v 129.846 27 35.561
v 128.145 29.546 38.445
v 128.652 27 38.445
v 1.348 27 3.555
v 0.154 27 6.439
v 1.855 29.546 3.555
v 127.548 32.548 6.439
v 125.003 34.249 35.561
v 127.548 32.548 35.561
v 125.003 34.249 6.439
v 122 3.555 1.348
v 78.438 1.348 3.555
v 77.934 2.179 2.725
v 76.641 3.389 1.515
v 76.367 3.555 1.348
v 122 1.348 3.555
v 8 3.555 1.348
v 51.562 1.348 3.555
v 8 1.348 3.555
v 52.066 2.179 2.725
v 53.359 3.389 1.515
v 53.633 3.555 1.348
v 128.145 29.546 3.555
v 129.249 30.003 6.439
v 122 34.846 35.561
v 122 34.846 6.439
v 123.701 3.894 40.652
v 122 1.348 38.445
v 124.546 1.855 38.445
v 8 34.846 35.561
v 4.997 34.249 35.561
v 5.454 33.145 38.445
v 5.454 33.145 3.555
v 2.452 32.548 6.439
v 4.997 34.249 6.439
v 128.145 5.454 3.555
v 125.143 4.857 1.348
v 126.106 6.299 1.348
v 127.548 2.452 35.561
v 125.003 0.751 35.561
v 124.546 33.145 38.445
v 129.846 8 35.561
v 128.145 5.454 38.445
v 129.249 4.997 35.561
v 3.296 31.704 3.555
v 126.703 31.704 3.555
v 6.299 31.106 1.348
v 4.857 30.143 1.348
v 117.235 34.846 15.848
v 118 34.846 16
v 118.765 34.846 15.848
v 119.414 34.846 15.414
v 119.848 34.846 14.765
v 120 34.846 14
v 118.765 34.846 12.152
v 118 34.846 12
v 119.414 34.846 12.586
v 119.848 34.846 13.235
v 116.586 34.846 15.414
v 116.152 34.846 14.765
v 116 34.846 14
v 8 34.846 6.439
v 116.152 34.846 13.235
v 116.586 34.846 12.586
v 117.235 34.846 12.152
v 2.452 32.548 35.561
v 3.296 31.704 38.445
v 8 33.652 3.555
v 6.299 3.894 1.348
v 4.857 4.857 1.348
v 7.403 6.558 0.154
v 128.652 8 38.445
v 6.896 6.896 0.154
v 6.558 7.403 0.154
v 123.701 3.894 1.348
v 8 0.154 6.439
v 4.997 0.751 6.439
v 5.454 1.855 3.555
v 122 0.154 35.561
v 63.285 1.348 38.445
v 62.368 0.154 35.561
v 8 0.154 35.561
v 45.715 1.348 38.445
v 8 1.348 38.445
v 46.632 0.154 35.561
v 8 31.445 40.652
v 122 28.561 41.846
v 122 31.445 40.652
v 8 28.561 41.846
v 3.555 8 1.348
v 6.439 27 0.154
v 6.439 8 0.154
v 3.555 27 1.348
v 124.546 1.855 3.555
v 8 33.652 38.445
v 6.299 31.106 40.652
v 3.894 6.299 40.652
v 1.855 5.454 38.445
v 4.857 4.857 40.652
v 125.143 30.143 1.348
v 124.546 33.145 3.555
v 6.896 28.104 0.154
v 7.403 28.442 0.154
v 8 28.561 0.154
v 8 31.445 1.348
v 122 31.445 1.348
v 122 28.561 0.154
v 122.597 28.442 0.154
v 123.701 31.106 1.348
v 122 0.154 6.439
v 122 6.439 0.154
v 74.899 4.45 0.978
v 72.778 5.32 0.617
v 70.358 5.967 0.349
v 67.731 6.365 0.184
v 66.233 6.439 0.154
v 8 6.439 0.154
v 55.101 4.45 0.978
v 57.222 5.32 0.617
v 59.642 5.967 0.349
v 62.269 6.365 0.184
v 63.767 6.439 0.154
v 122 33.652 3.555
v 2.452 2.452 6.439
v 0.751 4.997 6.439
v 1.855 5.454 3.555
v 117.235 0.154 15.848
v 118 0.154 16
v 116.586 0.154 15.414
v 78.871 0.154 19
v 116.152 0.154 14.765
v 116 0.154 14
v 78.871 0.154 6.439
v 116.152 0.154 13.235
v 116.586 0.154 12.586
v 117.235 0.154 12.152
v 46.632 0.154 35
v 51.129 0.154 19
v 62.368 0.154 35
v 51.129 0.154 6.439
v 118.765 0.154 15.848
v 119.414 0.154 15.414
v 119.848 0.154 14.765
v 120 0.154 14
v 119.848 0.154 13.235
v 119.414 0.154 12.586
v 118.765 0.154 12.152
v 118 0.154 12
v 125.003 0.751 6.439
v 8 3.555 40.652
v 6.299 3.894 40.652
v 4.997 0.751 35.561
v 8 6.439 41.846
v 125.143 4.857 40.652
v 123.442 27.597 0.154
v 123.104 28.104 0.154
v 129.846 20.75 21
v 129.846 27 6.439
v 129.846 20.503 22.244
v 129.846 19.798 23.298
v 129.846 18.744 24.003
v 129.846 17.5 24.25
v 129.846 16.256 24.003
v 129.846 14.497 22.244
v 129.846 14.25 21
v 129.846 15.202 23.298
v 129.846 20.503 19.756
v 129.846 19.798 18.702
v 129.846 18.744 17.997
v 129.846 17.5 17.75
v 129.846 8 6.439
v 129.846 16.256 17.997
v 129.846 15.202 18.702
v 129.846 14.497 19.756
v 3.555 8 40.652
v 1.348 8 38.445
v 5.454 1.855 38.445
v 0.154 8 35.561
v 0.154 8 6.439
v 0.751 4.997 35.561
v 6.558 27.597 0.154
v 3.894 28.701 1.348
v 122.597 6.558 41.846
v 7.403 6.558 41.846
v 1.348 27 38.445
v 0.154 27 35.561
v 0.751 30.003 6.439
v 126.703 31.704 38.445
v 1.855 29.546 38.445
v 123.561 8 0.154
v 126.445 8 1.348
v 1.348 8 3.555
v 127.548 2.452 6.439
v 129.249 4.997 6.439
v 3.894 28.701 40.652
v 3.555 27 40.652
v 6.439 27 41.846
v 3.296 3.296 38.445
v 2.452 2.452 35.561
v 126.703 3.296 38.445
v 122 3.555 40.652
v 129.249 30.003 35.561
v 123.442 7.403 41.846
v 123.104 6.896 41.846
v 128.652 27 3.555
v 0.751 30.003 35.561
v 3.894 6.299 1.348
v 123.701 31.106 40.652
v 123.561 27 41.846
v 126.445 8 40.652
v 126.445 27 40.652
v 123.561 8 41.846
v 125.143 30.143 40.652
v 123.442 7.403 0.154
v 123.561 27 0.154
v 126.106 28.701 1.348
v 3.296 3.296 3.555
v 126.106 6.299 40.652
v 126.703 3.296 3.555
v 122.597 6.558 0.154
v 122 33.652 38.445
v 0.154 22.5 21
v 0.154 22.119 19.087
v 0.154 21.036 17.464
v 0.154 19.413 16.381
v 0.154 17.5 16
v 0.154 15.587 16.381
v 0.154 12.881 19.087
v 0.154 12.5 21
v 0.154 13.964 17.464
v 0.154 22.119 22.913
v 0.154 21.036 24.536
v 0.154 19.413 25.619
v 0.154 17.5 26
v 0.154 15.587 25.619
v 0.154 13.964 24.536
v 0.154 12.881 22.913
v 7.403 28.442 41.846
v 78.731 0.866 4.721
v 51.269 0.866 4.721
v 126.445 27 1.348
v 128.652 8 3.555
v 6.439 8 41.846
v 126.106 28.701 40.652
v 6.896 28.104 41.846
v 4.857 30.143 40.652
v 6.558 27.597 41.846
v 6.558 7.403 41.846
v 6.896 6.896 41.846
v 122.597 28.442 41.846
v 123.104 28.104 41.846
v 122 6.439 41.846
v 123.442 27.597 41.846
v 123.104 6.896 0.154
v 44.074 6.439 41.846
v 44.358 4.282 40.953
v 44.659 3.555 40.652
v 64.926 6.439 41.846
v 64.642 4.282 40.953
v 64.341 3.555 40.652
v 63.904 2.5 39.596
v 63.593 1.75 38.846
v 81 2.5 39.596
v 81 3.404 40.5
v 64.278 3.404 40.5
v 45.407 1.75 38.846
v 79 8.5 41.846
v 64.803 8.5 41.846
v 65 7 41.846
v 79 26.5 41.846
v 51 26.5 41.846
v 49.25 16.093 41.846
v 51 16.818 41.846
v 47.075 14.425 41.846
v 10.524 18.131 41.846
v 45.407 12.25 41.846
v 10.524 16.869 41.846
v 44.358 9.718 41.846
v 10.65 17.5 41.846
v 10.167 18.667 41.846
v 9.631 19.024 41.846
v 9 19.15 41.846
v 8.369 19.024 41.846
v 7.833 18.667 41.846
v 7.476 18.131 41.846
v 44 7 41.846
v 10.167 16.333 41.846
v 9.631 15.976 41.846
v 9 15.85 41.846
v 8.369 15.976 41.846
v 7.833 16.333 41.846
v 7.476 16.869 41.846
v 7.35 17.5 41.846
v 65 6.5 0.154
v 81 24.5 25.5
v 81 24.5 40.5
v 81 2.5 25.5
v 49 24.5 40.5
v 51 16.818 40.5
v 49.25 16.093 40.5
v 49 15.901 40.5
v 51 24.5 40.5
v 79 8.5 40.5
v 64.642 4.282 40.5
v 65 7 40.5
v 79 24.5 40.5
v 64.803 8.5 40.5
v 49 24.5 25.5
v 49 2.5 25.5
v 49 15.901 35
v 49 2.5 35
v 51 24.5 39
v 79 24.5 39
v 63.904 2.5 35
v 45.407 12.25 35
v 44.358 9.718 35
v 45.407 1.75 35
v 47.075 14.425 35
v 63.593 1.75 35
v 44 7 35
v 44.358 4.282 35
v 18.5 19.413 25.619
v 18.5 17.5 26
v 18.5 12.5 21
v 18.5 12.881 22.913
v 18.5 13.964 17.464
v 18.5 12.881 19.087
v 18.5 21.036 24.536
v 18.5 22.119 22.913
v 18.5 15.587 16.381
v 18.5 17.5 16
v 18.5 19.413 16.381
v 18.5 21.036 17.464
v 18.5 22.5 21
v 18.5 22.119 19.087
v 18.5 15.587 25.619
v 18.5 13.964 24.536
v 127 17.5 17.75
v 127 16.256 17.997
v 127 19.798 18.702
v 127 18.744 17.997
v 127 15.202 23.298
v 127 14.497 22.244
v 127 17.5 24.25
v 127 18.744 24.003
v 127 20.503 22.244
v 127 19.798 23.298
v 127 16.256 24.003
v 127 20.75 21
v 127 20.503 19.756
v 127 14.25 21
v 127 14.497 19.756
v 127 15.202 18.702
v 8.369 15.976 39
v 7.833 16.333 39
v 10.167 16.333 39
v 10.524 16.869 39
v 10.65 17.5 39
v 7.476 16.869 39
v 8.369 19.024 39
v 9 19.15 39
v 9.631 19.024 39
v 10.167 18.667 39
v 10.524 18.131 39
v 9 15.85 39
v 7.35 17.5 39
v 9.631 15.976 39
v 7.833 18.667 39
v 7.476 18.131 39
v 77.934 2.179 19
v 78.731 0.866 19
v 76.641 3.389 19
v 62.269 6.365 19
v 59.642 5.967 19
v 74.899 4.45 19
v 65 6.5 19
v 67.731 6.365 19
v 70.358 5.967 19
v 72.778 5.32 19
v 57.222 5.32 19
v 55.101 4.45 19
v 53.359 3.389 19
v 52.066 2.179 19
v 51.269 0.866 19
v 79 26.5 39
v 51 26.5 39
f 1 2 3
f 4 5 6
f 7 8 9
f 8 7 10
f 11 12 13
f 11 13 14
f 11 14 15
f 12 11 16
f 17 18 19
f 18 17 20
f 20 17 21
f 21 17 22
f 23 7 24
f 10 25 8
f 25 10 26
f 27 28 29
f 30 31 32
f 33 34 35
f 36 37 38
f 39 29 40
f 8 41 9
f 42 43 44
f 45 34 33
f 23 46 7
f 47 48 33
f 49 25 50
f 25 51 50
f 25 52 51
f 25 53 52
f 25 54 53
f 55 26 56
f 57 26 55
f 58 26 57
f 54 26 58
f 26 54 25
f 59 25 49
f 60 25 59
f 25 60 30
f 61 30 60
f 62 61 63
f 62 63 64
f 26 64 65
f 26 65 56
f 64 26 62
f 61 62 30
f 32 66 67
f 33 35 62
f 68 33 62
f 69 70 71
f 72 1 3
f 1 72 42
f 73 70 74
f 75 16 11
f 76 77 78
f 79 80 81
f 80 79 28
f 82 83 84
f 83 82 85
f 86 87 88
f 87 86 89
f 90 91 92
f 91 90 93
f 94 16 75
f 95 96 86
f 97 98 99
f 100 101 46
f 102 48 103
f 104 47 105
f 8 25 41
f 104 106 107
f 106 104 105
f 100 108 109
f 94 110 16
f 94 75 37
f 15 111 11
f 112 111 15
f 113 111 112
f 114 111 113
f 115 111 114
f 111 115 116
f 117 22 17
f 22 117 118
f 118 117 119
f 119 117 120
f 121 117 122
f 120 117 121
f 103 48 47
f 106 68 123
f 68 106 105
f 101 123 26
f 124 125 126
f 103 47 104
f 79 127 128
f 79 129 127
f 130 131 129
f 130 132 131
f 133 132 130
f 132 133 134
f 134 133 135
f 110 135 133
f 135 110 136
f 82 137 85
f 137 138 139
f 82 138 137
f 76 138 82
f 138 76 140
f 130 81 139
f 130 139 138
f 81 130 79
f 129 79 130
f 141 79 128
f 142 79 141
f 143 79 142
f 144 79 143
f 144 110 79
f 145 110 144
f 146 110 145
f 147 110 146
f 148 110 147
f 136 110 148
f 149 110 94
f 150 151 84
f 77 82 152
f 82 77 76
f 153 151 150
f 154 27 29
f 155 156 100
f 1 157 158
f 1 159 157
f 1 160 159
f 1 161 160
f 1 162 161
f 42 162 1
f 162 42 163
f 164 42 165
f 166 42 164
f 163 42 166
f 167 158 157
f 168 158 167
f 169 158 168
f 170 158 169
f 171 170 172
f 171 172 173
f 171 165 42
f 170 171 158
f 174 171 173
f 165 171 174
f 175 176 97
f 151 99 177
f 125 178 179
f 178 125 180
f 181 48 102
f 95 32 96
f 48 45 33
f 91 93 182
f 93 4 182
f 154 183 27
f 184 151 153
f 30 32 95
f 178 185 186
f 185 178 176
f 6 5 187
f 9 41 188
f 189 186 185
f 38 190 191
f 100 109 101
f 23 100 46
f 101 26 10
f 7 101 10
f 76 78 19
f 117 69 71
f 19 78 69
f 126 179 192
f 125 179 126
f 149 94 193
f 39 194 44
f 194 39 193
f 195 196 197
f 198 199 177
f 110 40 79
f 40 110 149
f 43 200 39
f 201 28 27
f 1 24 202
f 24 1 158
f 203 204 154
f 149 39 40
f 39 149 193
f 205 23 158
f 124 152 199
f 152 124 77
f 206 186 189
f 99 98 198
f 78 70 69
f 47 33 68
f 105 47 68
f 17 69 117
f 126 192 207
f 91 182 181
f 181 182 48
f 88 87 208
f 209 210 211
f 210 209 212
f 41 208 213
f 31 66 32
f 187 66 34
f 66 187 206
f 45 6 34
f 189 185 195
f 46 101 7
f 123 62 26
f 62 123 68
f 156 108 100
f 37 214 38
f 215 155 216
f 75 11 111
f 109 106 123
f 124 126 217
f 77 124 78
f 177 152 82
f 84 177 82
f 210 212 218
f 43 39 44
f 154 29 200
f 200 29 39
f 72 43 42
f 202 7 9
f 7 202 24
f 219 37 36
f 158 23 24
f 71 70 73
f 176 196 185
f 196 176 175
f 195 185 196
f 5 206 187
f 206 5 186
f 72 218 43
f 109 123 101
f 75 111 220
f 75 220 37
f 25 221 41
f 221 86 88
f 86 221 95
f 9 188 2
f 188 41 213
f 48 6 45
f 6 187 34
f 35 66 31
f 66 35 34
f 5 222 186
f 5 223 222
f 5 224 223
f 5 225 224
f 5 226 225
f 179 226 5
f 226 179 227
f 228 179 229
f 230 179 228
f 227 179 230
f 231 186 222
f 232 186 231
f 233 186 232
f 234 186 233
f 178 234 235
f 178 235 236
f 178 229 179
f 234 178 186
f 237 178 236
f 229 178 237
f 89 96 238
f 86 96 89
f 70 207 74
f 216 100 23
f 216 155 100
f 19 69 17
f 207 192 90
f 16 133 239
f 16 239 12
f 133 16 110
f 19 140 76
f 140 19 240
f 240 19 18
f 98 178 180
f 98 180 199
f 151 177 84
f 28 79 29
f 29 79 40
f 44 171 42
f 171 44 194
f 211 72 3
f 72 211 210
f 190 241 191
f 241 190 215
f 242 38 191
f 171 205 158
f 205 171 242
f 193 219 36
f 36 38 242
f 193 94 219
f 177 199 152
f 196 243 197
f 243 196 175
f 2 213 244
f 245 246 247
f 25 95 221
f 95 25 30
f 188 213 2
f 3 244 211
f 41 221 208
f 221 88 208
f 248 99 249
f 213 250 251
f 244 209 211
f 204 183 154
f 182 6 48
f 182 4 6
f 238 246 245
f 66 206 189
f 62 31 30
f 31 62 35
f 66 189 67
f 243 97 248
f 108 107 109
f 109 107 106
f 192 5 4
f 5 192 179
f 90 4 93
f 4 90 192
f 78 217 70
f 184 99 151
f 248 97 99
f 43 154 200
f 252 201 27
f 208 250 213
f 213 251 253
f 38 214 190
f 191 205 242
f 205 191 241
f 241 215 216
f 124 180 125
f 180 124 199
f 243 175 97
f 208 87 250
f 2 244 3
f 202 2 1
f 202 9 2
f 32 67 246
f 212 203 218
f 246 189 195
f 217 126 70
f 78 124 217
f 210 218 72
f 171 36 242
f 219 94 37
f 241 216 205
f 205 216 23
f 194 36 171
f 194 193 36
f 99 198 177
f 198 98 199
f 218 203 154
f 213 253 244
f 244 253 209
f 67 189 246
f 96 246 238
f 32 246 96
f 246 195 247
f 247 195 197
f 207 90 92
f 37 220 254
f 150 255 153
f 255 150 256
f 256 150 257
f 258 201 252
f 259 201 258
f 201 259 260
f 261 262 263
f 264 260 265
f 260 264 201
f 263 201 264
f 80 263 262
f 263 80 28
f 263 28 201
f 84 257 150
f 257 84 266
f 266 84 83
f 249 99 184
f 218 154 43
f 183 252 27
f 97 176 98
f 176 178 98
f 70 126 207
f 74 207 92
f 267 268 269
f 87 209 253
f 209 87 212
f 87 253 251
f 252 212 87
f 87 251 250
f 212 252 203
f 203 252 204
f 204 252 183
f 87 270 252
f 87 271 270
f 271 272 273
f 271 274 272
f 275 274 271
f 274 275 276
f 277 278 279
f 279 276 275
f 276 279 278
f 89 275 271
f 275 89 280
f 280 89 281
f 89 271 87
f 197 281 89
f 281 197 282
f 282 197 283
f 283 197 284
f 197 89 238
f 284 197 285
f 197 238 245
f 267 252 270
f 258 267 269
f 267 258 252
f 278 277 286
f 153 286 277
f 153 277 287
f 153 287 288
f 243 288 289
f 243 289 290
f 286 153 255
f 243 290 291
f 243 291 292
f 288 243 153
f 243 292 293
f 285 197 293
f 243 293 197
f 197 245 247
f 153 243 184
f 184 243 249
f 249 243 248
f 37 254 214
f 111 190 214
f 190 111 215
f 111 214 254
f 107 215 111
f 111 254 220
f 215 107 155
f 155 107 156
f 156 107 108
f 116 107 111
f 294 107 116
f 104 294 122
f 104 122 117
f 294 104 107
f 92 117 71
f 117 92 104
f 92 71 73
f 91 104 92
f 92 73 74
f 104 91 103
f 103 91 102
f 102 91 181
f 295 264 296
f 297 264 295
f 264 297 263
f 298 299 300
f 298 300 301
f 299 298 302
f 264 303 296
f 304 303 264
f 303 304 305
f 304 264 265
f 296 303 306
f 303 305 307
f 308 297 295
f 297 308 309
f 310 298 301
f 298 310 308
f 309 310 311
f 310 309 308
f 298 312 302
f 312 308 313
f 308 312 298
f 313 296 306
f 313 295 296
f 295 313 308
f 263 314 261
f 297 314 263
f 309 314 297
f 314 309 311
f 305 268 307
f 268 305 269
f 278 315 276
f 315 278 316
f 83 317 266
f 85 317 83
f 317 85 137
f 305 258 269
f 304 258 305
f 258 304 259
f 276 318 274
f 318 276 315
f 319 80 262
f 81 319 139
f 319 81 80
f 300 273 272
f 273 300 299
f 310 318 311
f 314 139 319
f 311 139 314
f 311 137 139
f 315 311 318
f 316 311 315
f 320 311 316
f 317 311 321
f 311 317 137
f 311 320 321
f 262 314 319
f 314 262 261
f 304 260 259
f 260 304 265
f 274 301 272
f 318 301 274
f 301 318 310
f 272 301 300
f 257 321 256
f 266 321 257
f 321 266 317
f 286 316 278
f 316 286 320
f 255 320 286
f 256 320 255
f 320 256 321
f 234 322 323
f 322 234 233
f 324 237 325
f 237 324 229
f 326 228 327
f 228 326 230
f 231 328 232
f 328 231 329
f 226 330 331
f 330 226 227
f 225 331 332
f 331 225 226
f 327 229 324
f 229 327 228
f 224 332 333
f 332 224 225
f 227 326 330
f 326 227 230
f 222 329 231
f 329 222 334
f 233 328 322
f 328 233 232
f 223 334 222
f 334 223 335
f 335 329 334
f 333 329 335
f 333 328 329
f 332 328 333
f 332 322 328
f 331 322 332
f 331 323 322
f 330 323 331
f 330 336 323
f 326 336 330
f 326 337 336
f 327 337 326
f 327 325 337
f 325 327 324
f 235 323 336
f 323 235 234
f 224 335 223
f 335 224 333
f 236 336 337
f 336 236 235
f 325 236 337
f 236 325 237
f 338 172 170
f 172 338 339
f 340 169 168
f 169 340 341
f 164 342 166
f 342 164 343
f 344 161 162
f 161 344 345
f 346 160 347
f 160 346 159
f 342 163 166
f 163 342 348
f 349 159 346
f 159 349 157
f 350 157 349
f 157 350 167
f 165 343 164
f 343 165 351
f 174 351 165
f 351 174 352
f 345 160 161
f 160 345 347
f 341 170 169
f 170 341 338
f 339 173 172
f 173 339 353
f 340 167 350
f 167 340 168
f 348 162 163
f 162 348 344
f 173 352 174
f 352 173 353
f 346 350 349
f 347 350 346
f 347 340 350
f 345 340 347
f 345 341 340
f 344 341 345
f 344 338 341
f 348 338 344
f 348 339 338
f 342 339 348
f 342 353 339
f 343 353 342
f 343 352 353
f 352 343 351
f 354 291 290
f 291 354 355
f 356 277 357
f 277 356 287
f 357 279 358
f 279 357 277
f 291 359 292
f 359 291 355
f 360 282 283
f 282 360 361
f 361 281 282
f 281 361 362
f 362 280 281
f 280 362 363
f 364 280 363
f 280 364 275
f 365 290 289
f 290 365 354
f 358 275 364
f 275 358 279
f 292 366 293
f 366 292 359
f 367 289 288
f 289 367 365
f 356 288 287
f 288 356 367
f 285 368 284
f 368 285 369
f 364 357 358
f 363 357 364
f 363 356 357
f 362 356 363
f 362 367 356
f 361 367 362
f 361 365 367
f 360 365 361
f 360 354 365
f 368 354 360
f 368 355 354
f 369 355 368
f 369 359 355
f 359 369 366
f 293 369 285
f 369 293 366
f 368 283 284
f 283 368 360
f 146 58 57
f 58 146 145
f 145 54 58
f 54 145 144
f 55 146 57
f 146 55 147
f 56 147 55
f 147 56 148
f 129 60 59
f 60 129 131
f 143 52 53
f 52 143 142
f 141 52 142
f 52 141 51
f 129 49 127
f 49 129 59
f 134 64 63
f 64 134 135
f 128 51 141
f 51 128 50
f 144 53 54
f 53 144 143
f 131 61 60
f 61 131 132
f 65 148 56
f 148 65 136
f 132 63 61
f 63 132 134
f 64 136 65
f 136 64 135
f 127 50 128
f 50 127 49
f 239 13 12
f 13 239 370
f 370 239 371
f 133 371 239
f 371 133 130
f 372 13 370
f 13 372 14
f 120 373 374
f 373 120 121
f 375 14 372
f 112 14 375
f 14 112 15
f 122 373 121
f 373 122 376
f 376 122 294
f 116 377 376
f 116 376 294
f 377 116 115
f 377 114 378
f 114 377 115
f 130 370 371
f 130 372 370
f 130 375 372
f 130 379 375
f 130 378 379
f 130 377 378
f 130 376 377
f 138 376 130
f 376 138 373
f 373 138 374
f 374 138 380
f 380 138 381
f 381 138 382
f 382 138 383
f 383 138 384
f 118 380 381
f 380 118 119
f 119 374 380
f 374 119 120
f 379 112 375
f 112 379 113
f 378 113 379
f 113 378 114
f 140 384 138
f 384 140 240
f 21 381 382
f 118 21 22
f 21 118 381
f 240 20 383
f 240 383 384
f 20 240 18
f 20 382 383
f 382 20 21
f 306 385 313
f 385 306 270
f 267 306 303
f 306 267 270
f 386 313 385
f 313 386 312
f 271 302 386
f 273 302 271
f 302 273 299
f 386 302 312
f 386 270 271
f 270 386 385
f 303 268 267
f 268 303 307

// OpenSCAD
/**
 * rfi_sniffer_handle.scad — TM-RFI-ENC-004 Rev A
 * RFI Near-Field Sniffer Probe Handle
 *
 * Two configurations sharing same handle body:
 *   Config A: H-field shielded loop (100mm loop, RG-178 coax)
 *   Config B: E-field rod probe (100mm rod, JFET preamp in handle)
 *
 * Features:
 *   - Ergonomic pistol-grip handle, 130mm long
 *   - Probe tip snaps into front socket (interchangeable tips)
 *   - Preamp PCB cavity: 30×20×12 mm (optional, for E-field active version)
 *   - Cable exit: rear (SMA(F) connector or strain-relief for RG-178)
 *   - Battery cavity: CR2032 × 1 (for preamp power if no bias-T)
 *   - Loop tip socket: holds 100mm loop securely
 *   - Rod tip socket: holds 100mm rod securely
 *
 * Envelope: 150×45×35 mm
 */

// ── Parameters ─────────────────────────────────────────────────────────────
// Handle body
handle_l  = 130.0;  // length
handle_w  = 35.0;   // width
handle_h  = 42.0;   // height (grip height)
wall      = 2.5;
r = 8.0;
$fn = 32;

// Probe tip socket (front)
tip_bore_d  = 10.0;   // bore for SMA barrel or coax
tip_bore_l  = 18.0;   // depth of socket

// PCB cavity (for preamp)
pcb_w   = 32.0;
pcb_d   = 22.0;
pcb_h   = 14.0;

// Battery cavity (CR2032: 20mm dia × 3.2mm)
batt_d  = 21.0;
batt_h  = 4.5;

// Cable exit (rear SMA: 6.5mm hole, or strain relief: 9mm)
rear_exit_d = 6.5;   // SMA(F) or strain relief

// Set screw (probe tip retention, M3)
sscrew_d = 3.3;

// Mounting hole (for lanyard or bench mount)
lanyard_d = 4.0;

// ── Body ─────────────────────────────────────────────────────────────────────
module handle_body() {
    difference() {
        // Outer ergonomic shape: rounded cuboid with finger indentations
        hull()
            for (x=[r, handle_l-r]) for (y=[r, handle_w-r]) for (z=[r, handle_h-r])
                translate([x, y, z]) sphere(r=r, $fn=16);

        // Interior cavity (preamp + battery space)
        translate([handle_l/2 - pcb_w/2, wall, handle_h - pcb_h - wall])
            cube([pcb_w, pcb_d, pcb_h + 1]);

        // Battery cavity (side access)
        translate([handle_l/2 - batt_d/2, handle_w/2 - batt_d/2, handle_h - batt_h - wall])
            cylinder(h=batt_h+wall+1, d=batt_d, $fn=24);

        // Probe tip socket (front face)
        translate([-0.5, handle_w/2, handle_h/2])
        rotate([0, 90, 0])
            cylinder(h=tip_bore_l+1, d=tip_bore_d, $fn=16);

        // Cable exit (rear face, SMA)
        translate([handle_l+0.5, handle_w/2, handle_h/2])
        rotate([0, -90, 0])
            cylinder(h=wall+1, d=rear_exit_d, $fn=16);

        // Set screw for probe tip retention (top, near front)
        translate([tip_bore_l/2, handle_w/2, handle_h + 0.5])
        rotate([180, 0, 0])
            cylinder(h=wall+1, d=sscrew_d, $fn=16);

        // Lanyard hole (rear bottom)
        translate([handle_l - 12, -0.5, handle_h/3])
        rotate([-90, 0, 0])
            cylinder(h=handle_w+1, d=lanyard_d, $fn=16);

        // Finger groove (makes grip ergonomic) — slight indentation on bottom
        translate([handle_l/2, -0.5, -2])
            scale([1, 0.5, 1])
            cylinder(h=handle_h/2, r=handle_w*0.4, $fn=32);

        // Top access slot (for accessing PCB/battery — covered by snap lid)
        translate([handle_l/2 - pcb_w/2 + 2, handle_w/2 - pcb_d/2 + 2,
                   handle_h - wall - 0.5])
            cube([pcb_w-4, pcb_d-4, wall+1]);
    }
}

// ── Probe tip: H-field loop socket ────────────────────────────────────────
// Accepts 100mm diameter shielded loop (made from RG-178 coax)
module loop_tip_socket() {
    // SMA barrel fits in tip_bore; loop body is larger
    // This adaptor: 10mm bore back, 15mm collar front
    difference() {
        cylinder(h=22, d=16, $fn=24);
        // SMA barrel bore
        translate([0,0,-0.5]) cylinder(h=22+1, d=tip_bore_d, $fn=16);
        // Loop plane slot (narrow slot for loop to exit sideways)
        translate([-1, -0.5, 12]) cube([2, 16, 12]);  // slot for loop
    }
}

// ── Probe tip: E-field rod socket ────────────────────────────────────────
// 100mm rod slides in
module rod_tip_socket() {
    rod_d = 2.5;   // 2mm rod + clearance
    difference() {
        cylinder(h=22, d=10, $fn=24);
        translate([0,0,-0.5]) cylinder(h=22+1, d=rod_d, $fn=16);
    }
}

// ── Render ─────────────────────────────────────────────────────────────────
print_part = "handle";  // "handle" | "loop_tip" | "rod_tip"

if (print_part == "handle") {
    color("darkgreen", 0.9) handle_body();
} else if (print_part == "loop_tip") {
    color("olive", 0.9) loop_tip_socket();
} else {
    color("darkolivegreen", 0.9) rod_tip_socket();
}

// ── Assembly Notes ──────────────────────────────────────────────────────────
// H-FIELD LOOP ASSEMBLY:
//   1. Print handle + loop_tip_socket.
//   2. Form 100mm loop from RG-178 miniature coax (34cm length).
//   3. Solder SMA(M) at one end; thread loop body through slot in loop_tip_socket.
//   4. Secure loop to socket with epoxy or cable tie.
//   5. Insert SMA barrel into handle tip bore; secure with M3 set screw.
//   6. Install SPF5189Z or MAR-6+ preamp PCB in PCB cavity.
//   7. Connect coax from loop SMA → preamp → output SMA at rear.
//   8. Power: CR2032 in battery cavity, or bias-T from SDR (remove battery).
//
// E-FIELD ROD ASSEMBLY:
//   1. Print handle + rod_tip_socket.
//   2. Press-fit 2mm stainless rod into rod_tip_socket bore.
//   3. Connect rod wire to J310 JFET gate (in PCB cavity).
//   4. Install J310 source follower PCB in PCB cavity.
//   5. Route output to rear SMA.
//   6. ALWAYS add 20 dB SMA attenuator at SDR input when using E-field probe.
